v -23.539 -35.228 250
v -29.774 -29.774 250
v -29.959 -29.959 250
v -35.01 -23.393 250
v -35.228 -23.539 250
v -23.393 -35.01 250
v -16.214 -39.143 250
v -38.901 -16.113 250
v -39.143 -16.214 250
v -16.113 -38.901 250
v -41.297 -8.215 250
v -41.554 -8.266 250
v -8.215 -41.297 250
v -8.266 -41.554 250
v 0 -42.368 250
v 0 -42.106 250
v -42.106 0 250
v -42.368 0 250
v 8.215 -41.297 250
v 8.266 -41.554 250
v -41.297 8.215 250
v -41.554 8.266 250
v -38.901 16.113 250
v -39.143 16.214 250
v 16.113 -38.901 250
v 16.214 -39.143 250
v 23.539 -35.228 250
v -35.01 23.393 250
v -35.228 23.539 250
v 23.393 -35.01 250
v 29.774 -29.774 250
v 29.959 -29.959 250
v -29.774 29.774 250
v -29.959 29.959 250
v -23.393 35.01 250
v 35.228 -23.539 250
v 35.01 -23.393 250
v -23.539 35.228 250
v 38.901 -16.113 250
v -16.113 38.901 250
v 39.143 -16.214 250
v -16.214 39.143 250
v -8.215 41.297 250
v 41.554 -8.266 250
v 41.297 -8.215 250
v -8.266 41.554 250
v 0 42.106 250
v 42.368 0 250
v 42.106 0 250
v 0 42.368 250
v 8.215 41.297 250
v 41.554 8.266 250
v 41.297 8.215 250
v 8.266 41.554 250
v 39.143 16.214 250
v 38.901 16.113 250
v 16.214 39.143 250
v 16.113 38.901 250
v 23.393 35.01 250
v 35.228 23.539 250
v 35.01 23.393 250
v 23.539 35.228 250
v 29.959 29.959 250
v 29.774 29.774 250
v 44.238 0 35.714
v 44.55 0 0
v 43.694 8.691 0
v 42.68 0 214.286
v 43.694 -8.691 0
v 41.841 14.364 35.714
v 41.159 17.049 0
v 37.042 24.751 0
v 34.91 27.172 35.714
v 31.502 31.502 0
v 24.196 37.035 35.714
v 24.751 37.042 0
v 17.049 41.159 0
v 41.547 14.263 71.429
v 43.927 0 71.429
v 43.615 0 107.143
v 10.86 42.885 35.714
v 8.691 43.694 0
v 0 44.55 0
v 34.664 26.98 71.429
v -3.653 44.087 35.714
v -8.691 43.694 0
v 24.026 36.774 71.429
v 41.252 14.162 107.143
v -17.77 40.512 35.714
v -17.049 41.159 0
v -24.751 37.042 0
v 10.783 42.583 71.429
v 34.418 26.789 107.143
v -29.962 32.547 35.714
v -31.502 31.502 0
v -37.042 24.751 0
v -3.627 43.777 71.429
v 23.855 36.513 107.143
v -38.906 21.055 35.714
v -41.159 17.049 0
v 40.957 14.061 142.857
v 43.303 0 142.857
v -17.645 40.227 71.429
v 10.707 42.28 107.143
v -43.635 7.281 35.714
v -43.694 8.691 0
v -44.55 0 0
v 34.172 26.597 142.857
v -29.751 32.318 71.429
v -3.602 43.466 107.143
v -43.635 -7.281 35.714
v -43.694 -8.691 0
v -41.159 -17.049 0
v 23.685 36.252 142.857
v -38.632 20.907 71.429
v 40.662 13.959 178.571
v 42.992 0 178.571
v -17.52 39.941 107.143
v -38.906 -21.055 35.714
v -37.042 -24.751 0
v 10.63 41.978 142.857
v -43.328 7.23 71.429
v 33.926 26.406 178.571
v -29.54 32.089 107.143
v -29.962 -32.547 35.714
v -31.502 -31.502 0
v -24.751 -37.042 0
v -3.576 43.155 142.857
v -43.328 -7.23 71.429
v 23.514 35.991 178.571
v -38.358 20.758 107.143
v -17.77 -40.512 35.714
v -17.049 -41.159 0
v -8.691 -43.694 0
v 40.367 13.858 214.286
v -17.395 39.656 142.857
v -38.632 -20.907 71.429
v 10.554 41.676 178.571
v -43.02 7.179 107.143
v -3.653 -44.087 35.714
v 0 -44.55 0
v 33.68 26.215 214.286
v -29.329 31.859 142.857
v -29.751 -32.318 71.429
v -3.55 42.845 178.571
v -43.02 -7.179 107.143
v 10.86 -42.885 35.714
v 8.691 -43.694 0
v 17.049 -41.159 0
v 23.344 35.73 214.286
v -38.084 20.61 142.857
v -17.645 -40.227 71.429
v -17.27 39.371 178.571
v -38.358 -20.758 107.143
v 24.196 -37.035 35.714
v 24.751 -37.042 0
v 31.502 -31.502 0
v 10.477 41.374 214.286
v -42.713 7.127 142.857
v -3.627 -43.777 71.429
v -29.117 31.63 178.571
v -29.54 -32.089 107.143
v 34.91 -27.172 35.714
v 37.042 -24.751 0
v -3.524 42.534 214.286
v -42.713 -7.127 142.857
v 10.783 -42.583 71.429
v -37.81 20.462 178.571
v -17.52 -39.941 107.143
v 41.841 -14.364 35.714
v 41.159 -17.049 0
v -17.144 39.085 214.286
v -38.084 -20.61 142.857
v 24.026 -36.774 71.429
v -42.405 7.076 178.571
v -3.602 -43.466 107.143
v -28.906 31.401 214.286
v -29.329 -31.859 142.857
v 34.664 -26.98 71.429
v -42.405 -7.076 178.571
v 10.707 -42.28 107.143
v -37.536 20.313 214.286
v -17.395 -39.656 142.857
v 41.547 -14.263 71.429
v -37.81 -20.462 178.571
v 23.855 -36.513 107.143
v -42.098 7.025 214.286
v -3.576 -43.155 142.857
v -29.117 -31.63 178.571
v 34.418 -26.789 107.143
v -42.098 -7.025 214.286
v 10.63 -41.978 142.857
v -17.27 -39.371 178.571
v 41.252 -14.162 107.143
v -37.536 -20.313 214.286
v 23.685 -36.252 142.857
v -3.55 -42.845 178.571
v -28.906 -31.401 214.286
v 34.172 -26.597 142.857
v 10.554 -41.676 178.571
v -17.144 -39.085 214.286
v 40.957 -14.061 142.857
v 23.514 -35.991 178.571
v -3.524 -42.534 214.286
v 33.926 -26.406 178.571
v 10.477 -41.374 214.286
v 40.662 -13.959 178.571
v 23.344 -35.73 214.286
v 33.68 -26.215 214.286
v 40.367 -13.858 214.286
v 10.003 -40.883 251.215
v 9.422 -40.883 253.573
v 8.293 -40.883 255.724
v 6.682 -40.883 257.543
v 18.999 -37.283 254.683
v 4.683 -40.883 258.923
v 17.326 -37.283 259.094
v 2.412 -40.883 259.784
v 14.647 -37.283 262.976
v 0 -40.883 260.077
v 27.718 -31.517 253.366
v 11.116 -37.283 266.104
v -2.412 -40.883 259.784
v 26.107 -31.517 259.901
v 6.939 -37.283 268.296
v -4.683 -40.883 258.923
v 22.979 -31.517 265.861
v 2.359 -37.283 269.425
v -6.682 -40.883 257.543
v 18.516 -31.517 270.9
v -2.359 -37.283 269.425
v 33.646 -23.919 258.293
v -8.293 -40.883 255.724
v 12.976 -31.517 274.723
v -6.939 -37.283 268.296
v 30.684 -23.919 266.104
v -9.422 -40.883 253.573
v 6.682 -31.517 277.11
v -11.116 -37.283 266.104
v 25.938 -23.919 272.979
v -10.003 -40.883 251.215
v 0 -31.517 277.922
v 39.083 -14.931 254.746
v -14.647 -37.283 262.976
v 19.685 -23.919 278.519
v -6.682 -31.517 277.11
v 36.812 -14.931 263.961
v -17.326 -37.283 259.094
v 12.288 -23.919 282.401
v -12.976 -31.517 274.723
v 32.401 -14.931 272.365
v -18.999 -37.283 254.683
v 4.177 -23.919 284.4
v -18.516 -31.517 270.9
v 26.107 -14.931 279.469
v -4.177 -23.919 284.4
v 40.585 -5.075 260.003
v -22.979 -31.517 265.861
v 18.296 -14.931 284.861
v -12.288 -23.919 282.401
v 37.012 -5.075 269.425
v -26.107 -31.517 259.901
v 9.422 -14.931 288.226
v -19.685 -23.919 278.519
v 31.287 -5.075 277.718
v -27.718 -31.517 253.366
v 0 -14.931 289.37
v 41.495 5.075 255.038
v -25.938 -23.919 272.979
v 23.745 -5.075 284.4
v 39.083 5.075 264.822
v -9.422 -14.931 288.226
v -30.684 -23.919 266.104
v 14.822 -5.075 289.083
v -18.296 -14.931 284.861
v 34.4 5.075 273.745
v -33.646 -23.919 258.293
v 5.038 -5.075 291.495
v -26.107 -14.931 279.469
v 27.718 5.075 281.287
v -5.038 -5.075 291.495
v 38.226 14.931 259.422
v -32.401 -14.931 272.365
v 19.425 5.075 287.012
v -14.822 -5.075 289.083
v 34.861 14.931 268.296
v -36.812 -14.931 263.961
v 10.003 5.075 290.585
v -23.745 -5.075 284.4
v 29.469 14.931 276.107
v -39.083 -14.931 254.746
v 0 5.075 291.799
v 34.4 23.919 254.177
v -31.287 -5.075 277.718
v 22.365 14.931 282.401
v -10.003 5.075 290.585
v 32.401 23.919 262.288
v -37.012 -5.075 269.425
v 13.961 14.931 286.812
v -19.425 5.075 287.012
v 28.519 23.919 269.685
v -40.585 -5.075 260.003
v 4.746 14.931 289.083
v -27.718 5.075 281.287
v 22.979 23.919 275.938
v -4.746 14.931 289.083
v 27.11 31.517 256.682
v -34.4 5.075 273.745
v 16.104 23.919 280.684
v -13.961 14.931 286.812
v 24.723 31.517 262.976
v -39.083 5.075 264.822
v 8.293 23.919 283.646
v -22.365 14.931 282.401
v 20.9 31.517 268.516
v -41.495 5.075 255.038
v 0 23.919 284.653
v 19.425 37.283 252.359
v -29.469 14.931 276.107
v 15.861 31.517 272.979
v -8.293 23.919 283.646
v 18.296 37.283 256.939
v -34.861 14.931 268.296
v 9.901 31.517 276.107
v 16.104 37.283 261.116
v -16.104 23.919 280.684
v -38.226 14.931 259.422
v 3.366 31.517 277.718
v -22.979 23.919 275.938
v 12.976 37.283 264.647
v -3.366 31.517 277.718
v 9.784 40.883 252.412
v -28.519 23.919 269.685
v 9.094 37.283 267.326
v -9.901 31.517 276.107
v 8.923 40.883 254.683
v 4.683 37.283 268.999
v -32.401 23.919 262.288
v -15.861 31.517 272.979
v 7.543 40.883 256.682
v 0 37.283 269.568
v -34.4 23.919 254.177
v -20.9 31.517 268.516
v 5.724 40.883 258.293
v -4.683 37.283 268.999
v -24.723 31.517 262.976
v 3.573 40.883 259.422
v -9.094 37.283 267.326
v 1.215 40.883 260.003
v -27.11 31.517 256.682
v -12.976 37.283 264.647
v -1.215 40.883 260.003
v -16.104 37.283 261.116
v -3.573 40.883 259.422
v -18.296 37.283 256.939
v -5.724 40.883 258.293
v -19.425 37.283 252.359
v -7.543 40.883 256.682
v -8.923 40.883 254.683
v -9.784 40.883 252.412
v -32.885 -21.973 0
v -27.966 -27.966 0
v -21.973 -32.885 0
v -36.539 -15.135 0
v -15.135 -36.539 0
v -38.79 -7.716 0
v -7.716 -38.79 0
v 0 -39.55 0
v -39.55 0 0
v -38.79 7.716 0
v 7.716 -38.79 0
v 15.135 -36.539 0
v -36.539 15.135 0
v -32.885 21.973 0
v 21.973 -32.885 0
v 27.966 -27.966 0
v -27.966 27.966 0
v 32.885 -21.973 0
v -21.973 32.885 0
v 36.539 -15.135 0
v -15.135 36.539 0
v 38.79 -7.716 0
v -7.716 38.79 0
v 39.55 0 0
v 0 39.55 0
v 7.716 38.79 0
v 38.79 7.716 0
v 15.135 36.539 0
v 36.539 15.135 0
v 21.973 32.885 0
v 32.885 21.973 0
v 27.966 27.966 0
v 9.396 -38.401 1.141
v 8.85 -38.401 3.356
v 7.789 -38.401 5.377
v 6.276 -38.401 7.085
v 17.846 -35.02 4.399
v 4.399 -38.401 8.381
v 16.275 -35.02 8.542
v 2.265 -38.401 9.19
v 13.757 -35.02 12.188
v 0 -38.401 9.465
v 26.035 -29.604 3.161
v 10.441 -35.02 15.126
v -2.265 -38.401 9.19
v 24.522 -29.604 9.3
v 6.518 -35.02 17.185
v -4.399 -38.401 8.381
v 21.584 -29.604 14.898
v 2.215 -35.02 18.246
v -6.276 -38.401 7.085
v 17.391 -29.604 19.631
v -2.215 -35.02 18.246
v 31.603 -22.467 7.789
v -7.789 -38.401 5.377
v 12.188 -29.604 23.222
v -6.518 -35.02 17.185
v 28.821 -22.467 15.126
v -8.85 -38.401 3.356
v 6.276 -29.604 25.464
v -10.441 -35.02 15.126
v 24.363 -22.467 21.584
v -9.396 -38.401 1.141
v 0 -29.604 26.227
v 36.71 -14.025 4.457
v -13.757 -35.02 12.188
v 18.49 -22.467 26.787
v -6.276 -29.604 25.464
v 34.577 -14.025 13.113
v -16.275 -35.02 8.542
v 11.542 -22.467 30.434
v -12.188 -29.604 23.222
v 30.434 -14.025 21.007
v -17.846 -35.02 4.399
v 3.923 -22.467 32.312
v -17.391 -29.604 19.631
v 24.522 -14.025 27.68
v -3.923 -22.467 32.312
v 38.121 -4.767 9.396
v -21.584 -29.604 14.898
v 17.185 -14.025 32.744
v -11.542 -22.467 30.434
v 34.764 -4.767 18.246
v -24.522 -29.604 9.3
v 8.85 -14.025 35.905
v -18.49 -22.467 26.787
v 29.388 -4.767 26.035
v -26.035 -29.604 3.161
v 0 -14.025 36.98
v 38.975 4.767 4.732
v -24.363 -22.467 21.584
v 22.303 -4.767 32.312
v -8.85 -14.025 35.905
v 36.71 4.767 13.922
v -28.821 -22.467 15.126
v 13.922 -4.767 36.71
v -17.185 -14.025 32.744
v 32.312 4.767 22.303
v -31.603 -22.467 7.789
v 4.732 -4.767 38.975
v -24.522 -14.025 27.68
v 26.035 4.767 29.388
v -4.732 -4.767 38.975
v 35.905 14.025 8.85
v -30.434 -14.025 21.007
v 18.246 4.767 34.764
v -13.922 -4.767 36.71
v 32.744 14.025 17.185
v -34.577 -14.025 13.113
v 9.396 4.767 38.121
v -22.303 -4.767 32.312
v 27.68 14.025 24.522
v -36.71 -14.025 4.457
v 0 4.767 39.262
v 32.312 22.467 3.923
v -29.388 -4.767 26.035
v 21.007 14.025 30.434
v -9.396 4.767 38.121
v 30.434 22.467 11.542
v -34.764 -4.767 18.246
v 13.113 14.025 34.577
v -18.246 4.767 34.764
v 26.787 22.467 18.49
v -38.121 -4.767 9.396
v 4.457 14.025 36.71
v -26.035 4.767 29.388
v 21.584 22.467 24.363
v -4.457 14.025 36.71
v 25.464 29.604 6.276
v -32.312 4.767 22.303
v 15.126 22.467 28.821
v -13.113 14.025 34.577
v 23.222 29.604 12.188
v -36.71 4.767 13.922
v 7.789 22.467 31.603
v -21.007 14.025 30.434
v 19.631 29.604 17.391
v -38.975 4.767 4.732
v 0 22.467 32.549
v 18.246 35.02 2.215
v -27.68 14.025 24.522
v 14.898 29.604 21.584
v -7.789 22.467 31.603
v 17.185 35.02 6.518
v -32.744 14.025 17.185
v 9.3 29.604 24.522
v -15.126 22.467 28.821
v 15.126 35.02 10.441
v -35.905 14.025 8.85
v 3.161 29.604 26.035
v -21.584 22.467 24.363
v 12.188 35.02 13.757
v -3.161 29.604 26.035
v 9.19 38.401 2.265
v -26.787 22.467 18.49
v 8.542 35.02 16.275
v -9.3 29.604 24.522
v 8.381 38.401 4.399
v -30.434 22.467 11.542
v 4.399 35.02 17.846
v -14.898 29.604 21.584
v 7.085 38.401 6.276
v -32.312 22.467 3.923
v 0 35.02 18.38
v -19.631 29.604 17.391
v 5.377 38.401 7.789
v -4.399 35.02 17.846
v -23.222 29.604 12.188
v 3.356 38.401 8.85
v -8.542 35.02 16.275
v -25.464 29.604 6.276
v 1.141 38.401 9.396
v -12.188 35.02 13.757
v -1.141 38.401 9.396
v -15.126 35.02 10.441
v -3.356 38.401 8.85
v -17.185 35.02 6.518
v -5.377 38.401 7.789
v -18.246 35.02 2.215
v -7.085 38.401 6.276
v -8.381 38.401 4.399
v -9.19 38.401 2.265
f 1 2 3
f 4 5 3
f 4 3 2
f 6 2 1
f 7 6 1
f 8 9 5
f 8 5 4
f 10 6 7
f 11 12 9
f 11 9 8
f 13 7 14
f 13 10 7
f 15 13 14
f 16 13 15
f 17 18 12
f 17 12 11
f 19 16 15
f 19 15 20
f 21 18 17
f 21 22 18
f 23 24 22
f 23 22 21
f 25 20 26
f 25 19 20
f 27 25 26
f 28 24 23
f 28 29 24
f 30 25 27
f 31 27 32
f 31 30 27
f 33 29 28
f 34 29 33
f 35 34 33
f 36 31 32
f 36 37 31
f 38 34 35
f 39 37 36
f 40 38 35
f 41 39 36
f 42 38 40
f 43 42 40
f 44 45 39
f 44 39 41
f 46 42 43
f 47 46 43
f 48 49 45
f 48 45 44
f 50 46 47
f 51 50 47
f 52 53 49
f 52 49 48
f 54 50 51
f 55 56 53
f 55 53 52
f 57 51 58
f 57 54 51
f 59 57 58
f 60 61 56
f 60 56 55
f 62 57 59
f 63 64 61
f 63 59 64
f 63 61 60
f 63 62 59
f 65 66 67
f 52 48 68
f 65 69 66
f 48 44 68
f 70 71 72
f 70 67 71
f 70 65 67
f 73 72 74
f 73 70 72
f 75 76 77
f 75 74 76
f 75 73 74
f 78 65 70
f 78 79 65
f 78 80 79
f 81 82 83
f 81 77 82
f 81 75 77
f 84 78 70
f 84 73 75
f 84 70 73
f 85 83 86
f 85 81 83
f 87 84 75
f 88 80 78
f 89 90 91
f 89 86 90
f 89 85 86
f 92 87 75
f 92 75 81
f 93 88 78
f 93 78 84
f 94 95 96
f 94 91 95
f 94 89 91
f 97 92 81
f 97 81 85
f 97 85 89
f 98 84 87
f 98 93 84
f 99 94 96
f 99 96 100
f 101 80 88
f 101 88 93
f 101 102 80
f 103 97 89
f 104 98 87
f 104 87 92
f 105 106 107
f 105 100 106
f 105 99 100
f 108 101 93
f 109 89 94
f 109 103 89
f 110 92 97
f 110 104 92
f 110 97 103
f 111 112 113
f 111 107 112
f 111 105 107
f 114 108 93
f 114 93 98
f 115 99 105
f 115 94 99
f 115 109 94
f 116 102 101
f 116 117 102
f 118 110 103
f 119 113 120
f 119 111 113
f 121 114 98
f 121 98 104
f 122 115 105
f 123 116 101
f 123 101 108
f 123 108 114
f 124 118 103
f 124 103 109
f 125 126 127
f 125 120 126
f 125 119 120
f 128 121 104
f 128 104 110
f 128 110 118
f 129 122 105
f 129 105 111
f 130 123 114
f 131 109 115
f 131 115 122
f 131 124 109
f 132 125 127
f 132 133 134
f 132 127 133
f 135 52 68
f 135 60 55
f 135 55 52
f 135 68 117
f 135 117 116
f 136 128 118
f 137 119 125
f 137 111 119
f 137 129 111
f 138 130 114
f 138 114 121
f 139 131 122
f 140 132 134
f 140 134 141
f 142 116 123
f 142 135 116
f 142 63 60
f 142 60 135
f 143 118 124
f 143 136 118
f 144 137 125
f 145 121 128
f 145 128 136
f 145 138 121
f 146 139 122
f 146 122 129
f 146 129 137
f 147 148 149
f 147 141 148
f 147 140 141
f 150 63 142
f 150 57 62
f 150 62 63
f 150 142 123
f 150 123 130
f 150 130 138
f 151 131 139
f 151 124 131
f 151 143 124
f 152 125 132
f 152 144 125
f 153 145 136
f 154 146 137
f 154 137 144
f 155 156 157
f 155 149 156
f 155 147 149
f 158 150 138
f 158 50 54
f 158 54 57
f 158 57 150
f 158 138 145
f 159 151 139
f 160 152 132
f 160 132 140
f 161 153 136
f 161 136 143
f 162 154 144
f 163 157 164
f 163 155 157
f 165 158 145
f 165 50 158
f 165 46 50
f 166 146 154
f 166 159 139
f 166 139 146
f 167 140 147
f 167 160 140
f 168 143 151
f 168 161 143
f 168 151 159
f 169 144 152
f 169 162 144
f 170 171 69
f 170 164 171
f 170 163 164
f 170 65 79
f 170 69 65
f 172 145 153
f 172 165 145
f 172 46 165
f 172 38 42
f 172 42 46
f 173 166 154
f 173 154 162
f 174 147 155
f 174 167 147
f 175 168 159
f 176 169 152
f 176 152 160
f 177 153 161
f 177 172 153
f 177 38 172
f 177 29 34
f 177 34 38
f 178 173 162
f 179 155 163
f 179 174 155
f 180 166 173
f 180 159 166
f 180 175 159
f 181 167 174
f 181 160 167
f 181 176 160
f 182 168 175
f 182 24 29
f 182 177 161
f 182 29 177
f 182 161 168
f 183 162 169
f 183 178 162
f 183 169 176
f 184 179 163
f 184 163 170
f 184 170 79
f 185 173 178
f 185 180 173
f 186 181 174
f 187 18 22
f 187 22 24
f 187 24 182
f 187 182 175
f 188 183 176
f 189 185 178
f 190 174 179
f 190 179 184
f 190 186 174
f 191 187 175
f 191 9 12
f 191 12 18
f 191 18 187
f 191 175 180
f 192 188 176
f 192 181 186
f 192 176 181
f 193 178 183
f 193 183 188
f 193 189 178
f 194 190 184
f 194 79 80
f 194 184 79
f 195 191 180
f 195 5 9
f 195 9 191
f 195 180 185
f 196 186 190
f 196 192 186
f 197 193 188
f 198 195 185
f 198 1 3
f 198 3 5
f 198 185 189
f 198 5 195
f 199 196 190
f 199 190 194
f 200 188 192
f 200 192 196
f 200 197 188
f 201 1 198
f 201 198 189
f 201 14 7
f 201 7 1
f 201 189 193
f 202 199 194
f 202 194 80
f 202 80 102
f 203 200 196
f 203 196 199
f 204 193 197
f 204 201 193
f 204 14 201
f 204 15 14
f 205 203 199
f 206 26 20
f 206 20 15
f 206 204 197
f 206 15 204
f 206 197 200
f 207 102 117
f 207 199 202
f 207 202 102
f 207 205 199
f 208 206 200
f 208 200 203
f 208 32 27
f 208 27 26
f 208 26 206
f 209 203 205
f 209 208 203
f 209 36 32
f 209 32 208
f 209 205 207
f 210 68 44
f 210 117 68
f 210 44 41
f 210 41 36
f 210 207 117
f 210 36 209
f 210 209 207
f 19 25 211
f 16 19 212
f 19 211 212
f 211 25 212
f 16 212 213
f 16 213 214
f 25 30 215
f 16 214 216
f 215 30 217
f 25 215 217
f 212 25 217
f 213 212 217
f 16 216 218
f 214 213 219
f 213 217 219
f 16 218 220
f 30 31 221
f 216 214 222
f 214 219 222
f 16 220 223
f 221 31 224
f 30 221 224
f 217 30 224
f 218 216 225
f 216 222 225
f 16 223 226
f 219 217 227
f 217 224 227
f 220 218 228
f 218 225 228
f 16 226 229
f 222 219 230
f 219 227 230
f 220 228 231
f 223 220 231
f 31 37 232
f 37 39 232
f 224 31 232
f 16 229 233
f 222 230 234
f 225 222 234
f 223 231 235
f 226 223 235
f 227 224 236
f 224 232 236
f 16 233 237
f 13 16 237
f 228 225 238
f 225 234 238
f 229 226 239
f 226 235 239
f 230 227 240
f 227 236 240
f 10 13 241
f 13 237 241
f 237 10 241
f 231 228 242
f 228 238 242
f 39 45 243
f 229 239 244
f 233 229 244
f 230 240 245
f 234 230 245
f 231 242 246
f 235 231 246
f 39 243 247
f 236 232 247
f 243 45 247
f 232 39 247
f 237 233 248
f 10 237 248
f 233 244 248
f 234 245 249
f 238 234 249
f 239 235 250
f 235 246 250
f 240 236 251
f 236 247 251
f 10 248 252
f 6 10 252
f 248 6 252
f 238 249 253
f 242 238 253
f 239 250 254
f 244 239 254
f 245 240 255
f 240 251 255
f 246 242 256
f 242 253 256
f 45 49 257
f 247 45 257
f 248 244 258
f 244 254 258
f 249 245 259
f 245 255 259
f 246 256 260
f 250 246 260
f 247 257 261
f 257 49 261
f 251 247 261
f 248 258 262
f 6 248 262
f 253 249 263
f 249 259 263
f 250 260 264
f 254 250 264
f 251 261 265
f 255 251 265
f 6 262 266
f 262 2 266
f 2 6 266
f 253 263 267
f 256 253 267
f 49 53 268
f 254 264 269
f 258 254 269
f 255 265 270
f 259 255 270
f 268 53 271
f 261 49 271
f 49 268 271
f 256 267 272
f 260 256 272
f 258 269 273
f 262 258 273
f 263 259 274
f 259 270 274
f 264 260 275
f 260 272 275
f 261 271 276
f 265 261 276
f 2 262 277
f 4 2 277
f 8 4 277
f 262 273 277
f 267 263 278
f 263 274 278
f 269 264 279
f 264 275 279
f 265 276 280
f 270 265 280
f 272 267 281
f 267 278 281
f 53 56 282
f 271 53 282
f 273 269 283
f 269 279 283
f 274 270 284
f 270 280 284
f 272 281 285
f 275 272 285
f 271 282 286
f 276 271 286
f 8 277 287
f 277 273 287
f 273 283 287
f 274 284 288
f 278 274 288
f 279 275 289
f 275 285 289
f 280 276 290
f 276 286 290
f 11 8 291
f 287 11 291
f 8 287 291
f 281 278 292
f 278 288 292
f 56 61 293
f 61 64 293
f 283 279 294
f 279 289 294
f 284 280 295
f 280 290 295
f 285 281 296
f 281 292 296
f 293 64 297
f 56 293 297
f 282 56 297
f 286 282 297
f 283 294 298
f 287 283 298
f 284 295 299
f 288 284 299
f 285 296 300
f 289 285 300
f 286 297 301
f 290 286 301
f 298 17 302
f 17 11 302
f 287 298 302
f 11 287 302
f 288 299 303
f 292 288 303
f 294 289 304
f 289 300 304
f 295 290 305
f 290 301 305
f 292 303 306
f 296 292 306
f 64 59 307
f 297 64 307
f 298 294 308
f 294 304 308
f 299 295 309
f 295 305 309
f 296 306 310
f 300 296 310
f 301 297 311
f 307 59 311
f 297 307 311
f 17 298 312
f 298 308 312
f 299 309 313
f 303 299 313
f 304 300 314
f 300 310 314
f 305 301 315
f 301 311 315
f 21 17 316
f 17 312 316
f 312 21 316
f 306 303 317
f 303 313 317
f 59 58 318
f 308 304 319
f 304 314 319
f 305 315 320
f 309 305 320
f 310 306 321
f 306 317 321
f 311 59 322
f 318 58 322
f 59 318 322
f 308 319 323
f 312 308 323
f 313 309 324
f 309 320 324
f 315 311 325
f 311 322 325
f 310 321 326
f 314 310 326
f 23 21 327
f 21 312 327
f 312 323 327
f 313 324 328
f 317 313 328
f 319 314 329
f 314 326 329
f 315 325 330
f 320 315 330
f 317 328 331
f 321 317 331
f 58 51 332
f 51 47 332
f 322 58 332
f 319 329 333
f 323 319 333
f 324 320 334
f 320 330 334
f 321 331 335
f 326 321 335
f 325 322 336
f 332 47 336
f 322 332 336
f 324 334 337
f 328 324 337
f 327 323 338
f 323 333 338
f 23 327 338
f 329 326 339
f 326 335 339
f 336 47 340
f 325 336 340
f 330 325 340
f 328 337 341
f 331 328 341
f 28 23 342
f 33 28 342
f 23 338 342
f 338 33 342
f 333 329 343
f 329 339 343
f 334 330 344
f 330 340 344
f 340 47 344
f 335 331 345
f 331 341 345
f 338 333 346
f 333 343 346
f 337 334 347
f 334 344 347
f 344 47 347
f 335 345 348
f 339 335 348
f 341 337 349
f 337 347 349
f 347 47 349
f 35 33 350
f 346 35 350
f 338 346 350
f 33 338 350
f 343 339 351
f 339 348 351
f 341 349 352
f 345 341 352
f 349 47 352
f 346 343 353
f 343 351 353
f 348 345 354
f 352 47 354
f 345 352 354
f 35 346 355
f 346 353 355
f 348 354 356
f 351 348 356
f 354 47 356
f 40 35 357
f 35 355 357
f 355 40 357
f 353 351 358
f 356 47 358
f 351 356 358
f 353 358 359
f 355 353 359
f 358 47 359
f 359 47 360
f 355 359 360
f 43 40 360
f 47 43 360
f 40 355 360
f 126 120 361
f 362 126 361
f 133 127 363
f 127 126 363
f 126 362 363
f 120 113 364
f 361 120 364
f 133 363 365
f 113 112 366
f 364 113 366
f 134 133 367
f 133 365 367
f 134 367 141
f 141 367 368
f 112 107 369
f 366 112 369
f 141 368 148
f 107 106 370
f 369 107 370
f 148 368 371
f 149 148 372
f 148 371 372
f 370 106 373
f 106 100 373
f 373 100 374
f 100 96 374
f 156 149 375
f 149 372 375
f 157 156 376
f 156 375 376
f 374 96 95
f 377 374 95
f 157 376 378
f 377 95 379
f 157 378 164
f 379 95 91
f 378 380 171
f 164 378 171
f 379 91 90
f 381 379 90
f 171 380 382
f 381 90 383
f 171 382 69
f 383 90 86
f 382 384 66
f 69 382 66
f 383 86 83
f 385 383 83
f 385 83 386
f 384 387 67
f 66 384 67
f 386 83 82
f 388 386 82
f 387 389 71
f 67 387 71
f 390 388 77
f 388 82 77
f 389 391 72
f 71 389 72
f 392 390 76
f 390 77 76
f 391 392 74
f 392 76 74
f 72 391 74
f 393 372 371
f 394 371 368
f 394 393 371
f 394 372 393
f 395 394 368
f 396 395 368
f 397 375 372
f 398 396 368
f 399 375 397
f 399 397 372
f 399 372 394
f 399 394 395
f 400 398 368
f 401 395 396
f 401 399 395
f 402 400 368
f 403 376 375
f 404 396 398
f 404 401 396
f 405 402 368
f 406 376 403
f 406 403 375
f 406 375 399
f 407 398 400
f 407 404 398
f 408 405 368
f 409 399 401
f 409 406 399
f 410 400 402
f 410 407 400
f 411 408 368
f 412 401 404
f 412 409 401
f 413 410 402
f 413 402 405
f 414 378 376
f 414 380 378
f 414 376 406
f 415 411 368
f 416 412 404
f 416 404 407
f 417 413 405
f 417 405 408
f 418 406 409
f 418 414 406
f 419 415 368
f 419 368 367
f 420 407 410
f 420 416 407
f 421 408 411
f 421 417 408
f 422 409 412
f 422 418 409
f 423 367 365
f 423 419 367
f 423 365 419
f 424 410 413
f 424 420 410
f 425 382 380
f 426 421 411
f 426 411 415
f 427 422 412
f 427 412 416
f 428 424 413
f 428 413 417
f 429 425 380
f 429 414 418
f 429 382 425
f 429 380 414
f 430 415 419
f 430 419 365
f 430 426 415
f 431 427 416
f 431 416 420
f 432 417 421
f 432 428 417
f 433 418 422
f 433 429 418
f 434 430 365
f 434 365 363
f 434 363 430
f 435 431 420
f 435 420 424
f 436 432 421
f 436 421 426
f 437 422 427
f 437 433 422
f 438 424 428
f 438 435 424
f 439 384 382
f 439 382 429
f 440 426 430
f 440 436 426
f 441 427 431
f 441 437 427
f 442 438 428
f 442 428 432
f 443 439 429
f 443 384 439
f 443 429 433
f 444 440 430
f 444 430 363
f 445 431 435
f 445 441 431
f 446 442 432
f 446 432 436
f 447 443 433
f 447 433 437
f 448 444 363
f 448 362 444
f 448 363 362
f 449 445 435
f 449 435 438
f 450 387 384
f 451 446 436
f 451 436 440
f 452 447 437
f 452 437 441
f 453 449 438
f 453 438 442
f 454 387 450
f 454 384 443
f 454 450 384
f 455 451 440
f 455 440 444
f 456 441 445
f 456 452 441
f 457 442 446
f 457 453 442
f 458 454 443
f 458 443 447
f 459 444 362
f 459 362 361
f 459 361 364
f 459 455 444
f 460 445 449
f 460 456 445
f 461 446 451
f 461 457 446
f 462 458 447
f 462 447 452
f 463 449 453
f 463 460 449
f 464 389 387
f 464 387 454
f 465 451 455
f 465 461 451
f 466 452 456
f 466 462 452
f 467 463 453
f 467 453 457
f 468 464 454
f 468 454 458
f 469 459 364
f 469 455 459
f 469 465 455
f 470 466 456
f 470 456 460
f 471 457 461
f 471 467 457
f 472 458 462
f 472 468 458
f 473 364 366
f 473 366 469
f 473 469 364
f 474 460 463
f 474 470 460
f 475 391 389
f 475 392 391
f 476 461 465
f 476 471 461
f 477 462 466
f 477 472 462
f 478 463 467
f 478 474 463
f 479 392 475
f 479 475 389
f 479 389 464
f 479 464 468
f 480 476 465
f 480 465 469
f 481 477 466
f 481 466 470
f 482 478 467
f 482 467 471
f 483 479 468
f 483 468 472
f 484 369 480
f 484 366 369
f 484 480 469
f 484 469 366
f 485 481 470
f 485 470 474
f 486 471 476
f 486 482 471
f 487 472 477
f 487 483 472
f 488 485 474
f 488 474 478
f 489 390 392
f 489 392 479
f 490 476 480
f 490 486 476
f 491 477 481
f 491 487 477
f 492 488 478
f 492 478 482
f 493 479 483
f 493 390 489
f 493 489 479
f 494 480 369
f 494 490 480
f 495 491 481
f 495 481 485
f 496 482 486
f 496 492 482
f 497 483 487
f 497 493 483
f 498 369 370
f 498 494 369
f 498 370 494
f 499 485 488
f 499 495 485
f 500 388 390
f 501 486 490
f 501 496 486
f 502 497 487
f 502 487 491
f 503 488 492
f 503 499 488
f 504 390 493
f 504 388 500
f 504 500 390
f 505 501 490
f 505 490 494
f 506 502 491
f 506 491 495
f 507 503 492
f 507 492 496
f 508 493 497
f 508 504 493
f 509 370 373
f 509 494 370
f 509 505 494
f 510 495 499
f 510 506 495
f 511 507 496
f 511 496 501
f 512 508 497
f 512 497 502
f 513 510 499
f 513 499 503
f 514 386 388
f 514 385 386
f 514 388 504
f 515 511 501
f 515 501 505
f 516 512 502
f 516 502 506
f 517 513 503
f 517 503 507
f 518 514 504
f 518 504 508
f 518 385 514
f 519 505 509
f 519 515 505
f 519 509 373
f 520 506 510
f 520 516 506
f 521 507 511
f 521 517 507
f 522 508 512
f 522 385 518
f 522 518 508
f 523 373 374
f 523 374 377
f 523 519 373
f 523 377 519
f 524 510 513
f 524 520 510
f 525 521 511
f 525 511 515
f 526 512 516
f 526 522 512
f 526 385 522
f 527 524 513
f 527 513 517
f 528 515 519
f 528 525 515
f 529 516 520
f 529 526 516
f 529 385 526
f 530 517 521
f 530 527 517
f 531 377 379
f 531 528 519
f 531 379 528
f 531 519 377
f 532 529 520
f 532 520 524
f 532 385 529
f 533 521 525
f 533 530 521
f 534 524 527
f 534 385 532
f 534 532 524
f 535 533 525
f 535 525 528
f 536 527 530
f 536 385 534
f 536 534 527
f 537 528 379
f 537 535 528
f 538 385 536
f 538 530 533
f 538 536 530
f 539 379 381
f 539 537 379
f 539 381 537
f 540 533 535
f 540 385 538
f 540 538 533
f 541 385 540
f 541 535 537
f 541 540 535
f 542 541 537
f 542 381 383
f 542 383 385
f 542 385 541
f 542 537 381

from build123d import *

# Parameters (mm, degrees)
SKETCH1_R           = 44.55
BOSS_EXTRUDE1_DEPTH = 250
BOSS_EXTRUDE1_TAPER = 0.5


with BuildPart() as part:
    # Sketch1 → Boss-Extrude1 (new body)
    with BuildSketch(Plane.XY):
        Circle(SKETCH1_R)
    extrude(amount=BOSS_EXTRUDE1_DEPTH, taper=BOSS_EXTRUDE1_TAPER)

    # Sketch2 → Cut-Revolve1 (revolve, cut)
    with BuildSketch(Plane(origin=(0, 0, 0), x_dir=(-1, 0, 0), z_dir=(0, 0, -1))):
        with BuildLine():
            Line((0, 39.55), (0, -39.55))
            ThreePointArc((0, -39.55), (39.55, 0), (0, 39.55))
        make_face()
    revolve(axis=Axis((0, 39.55, 0), (0, -1, 0)), mode=Mode.SUBTRACT)

    # Sketch3 → Revolve1 (revolve)
    with BuildSketch(Plane.XY.offset(250)):
        with BuildLine():
            Line((0, 42.106477019), (0, -42.106477019))
            ThreePointArc((0, -42.106477019), (-42.106477019, 0), (0, 42.106477019))
        make_face()
    revolve(axis=Axis((0, 42.106477019, 250), (0, -1, 0)))


solid = part.part
